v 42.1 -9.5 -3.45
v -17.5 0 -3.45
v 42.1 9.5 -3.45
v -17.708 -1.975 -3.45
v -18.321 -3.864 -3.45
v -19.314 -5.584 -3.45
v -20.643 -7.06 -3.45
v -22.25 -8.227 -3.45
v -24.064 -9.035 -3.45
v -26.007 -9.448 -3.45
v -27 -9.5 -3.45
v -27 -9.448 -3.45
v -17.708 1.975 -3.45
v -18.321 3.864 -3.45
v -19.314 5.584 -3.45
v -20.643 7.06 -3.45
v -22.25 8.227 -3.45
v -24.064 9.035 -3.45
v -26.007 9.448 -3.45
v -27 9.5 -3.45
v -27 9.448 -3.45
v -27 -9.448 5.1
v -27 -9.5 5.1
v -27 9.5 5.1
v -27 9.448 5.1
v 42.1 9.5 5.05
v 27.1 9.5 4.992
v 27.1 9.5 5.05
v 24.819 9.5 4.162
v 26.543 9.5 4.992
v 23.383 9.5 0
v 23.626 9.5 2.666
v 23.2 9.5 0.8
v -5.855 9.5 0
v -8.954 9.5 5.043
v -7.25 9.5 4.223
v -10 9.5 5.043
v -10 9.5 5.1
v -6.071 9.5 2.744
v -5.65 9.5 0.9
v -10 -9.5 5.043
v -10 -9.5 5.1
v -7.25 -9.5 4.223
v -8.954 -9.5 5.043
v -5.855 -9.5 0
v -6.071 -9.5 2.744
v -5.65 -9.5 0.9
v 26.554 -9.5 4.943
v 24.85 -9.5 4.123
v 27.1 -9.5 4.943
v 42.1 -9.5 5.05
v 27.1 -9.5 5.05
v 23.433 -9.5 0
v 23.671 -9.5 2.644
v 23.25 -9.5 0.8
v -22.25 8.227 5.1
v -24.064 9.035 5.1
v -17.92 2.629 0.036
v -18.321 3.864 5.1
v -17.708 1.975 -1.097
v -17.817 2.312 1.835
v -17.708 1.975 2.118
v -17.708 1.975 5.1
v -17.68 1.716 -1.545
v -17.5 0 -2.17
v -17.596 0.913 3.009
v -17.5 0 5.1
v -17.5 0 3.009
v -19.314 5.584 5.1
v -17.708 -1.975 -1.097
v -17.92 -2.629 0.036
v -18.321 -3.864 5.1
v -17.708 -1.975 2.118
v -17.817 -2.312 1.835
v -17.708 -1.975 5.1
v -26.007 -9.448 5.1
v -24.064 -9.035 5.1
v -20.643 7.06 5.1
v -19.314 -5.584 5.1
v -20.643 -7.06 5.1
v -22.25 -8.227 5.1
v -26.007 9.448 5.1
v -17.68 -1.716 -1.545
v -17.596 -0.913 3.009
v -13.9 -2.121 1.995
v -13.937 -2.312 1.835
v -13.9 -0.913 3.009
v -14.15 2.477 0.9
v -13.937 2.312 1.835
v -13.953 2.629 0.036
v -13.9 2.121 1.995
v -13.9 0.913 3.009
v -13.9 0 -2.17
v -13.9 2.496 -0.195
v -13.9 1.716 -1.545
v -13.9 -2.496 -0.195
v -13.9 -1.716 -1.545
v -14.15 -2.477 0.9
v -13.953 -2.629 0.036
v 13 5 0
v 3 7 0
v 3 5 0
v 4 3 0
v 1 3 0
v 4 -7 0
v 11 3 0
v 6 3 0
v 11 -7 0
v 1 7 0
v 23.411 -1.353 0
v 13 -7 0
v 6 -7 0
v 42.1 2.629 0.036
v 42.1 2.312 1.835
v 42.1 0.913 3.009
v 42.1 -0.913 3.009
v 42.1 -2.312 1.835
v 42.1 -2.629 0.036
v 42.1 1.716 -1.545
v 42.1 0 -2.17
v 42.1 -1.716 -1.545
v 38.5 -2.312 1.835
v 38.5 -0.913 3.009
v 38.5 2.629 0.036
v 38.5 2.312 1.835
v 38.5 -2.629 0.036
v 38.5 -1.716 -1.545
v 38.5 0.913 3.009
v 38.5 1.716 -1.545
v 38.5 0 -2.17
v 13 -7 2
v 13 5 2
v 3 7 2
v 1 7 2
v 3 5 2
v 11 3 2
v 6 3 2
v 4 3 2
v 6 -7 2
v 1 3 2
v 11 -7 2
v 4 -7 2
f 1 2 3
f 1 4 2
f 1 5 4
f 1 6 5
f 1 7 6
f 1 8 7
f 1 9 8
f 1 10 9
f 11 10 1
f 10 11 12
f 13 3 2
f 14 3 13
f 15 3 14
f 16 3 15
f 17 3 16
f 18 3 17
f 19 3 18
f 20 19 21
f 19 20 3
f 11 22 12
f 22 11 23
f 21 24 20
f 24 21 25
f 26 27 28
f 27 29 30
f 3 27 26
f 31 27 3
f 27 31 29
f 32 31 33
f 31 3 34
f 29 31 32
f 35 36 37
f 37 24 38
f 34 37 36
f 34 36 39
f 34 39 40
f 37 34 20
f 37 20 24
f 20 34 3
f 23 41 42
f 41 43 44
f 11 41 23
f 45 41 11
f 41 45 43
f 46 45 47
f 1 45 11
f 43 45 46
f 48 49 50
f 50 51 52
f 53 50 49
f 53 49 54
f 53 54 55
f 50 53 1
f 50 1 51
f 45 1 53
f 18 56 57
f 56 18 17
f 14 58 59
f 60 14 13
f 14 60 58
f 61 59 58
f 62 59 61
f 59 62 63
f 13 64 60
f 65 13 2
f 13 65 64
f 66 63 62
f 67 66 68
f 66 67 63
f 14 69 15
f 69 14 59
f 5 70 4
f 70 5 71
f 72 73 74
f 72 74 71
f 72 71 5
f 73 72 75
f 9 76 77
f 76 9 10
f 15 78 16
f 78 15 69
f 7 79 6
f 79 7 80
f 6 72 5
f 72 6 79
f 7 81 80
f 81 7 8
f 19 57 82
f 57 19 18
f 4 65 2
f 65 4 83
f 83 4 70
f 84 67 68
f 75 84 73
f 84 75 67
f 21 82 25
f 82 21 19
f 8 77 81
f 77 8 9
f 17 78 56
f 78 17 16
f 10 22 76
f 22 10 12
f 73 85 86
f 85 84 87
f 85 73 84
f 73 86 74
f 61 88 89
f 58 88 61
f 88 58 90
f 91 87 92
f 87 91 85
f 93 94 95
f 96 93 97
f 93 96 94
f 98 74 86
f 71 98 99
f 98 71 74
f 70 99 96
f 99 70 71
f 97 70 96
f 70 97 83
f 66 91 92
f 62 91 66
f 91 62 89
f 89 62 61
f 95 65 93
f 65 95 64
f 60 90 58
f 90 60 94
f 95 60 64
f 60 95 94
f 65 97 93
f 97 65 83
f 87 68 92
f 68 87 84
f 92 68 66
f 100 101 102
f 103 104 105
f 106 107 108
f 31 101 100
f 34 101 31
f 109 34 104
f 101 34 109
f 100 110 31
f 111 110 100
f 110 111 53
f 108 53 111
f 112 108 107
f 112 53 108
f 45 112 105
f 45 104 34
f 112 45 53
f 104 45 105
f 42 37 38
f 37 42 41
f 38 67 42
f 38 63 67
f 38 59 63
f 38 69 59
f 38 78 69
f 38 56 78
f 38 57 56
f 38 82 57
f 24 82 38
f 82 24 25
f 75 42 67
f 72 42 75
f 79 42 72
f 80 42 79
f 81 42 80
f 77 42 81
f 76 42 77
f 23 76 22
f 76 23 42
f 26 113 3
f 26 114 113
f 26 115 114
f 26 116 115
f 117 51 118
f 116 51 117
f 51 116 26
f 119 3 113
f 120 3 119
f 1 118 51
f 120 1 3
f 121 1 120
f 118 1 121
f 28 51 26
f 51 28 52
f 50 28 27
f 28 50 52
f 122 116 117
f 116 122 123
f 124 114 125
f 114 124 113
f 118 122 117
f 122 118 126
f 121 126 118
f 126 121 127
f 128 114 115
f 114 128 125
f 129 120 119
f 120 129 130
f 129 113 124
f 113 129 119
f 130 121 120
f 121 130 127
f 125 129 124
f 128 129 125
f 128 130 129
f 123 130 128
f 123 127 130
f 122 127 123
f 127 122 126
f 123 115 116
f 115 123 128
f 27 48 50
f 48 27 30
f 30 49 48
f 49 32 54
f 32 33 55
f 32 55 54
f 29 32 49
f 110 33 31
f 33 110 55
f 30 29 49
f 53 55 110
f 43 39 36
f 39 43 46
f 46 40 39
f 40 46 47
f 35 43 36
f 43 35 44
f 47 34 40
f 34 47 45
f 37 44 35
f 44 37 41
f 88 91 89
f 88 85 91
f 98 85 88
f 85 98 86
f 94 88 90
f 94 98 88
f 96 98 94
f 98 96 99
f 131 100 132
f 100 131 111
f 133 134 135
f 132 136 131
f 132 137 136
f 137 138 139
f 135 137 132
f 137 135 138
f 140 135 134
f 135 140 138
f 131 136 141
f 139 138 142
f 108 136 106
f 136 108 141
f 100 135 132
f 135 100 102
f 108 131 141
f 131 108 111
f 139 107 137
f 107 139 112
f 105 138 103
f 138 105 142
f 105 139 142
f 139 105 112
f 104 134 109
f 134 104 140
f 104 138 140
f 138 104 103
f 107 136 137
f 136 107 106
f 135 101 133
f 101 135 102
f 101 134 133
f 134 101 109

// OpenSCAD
//Азотистое основание: Цитозин 
d=2.67;
x=55;                        
y=19;                                                          
z=9; // по этой переменной можно менять толщину всей модели              
z2=2.5;
     
difference(){            
difference (){                                              
color("MediumPurple") translate ([2, 0, 2.55]) cube ([x+3, y, z+3], center=true);            
color("lime") translate ([-27, y/200000, -4]) cylinder (z+9, y/2, y/2);                
            
 }            
rotate([0, 90, 0]) translate([-0.5,0,-18.9]) cylinder(5, d, d); 
translate([-10, -10.5, 0]) cube([50, 21, 10]); //пространство
  translate([-27.9, -11, 5.1]) cube([53.5, 22, 8]); //верхнее пространство
}


//Плоскость для центрирования
//translate([4, -0.25, -10])cube([40, 0.5, 30]);

rotate([90, 0, 0]) translate([27.5, 0.8, -9.5]) cylinder(19, 4.3, 4.25);
difference() { 
  #translate([27.1, -9.5, -3.45]) cube([15, 19, 8.5]);
  #rotate([0, 90, 0]) translate([-.5, 0, 38.5]) cylinder(9, d, d);

//#rotate([0, 90, 0]) translate([-0.5, -4.5, 38.5]) cylinder(9, d, d);
}

#rotate([90, 0, 0]) translate([-9.9, 0.9, -9.5]) cylinder(19, 4.25, 4.25);


//буква Ц
  #translate([11, -7, 0]) cube([2, 12, 2]);
  #translate([4, -7, 0]) cube([2, 12, 2]);
  #translate([1, 3, 0]) cube([11, 2, 2]);
  #translate([1, 3, 0]) cube([2, 4, 2]);
